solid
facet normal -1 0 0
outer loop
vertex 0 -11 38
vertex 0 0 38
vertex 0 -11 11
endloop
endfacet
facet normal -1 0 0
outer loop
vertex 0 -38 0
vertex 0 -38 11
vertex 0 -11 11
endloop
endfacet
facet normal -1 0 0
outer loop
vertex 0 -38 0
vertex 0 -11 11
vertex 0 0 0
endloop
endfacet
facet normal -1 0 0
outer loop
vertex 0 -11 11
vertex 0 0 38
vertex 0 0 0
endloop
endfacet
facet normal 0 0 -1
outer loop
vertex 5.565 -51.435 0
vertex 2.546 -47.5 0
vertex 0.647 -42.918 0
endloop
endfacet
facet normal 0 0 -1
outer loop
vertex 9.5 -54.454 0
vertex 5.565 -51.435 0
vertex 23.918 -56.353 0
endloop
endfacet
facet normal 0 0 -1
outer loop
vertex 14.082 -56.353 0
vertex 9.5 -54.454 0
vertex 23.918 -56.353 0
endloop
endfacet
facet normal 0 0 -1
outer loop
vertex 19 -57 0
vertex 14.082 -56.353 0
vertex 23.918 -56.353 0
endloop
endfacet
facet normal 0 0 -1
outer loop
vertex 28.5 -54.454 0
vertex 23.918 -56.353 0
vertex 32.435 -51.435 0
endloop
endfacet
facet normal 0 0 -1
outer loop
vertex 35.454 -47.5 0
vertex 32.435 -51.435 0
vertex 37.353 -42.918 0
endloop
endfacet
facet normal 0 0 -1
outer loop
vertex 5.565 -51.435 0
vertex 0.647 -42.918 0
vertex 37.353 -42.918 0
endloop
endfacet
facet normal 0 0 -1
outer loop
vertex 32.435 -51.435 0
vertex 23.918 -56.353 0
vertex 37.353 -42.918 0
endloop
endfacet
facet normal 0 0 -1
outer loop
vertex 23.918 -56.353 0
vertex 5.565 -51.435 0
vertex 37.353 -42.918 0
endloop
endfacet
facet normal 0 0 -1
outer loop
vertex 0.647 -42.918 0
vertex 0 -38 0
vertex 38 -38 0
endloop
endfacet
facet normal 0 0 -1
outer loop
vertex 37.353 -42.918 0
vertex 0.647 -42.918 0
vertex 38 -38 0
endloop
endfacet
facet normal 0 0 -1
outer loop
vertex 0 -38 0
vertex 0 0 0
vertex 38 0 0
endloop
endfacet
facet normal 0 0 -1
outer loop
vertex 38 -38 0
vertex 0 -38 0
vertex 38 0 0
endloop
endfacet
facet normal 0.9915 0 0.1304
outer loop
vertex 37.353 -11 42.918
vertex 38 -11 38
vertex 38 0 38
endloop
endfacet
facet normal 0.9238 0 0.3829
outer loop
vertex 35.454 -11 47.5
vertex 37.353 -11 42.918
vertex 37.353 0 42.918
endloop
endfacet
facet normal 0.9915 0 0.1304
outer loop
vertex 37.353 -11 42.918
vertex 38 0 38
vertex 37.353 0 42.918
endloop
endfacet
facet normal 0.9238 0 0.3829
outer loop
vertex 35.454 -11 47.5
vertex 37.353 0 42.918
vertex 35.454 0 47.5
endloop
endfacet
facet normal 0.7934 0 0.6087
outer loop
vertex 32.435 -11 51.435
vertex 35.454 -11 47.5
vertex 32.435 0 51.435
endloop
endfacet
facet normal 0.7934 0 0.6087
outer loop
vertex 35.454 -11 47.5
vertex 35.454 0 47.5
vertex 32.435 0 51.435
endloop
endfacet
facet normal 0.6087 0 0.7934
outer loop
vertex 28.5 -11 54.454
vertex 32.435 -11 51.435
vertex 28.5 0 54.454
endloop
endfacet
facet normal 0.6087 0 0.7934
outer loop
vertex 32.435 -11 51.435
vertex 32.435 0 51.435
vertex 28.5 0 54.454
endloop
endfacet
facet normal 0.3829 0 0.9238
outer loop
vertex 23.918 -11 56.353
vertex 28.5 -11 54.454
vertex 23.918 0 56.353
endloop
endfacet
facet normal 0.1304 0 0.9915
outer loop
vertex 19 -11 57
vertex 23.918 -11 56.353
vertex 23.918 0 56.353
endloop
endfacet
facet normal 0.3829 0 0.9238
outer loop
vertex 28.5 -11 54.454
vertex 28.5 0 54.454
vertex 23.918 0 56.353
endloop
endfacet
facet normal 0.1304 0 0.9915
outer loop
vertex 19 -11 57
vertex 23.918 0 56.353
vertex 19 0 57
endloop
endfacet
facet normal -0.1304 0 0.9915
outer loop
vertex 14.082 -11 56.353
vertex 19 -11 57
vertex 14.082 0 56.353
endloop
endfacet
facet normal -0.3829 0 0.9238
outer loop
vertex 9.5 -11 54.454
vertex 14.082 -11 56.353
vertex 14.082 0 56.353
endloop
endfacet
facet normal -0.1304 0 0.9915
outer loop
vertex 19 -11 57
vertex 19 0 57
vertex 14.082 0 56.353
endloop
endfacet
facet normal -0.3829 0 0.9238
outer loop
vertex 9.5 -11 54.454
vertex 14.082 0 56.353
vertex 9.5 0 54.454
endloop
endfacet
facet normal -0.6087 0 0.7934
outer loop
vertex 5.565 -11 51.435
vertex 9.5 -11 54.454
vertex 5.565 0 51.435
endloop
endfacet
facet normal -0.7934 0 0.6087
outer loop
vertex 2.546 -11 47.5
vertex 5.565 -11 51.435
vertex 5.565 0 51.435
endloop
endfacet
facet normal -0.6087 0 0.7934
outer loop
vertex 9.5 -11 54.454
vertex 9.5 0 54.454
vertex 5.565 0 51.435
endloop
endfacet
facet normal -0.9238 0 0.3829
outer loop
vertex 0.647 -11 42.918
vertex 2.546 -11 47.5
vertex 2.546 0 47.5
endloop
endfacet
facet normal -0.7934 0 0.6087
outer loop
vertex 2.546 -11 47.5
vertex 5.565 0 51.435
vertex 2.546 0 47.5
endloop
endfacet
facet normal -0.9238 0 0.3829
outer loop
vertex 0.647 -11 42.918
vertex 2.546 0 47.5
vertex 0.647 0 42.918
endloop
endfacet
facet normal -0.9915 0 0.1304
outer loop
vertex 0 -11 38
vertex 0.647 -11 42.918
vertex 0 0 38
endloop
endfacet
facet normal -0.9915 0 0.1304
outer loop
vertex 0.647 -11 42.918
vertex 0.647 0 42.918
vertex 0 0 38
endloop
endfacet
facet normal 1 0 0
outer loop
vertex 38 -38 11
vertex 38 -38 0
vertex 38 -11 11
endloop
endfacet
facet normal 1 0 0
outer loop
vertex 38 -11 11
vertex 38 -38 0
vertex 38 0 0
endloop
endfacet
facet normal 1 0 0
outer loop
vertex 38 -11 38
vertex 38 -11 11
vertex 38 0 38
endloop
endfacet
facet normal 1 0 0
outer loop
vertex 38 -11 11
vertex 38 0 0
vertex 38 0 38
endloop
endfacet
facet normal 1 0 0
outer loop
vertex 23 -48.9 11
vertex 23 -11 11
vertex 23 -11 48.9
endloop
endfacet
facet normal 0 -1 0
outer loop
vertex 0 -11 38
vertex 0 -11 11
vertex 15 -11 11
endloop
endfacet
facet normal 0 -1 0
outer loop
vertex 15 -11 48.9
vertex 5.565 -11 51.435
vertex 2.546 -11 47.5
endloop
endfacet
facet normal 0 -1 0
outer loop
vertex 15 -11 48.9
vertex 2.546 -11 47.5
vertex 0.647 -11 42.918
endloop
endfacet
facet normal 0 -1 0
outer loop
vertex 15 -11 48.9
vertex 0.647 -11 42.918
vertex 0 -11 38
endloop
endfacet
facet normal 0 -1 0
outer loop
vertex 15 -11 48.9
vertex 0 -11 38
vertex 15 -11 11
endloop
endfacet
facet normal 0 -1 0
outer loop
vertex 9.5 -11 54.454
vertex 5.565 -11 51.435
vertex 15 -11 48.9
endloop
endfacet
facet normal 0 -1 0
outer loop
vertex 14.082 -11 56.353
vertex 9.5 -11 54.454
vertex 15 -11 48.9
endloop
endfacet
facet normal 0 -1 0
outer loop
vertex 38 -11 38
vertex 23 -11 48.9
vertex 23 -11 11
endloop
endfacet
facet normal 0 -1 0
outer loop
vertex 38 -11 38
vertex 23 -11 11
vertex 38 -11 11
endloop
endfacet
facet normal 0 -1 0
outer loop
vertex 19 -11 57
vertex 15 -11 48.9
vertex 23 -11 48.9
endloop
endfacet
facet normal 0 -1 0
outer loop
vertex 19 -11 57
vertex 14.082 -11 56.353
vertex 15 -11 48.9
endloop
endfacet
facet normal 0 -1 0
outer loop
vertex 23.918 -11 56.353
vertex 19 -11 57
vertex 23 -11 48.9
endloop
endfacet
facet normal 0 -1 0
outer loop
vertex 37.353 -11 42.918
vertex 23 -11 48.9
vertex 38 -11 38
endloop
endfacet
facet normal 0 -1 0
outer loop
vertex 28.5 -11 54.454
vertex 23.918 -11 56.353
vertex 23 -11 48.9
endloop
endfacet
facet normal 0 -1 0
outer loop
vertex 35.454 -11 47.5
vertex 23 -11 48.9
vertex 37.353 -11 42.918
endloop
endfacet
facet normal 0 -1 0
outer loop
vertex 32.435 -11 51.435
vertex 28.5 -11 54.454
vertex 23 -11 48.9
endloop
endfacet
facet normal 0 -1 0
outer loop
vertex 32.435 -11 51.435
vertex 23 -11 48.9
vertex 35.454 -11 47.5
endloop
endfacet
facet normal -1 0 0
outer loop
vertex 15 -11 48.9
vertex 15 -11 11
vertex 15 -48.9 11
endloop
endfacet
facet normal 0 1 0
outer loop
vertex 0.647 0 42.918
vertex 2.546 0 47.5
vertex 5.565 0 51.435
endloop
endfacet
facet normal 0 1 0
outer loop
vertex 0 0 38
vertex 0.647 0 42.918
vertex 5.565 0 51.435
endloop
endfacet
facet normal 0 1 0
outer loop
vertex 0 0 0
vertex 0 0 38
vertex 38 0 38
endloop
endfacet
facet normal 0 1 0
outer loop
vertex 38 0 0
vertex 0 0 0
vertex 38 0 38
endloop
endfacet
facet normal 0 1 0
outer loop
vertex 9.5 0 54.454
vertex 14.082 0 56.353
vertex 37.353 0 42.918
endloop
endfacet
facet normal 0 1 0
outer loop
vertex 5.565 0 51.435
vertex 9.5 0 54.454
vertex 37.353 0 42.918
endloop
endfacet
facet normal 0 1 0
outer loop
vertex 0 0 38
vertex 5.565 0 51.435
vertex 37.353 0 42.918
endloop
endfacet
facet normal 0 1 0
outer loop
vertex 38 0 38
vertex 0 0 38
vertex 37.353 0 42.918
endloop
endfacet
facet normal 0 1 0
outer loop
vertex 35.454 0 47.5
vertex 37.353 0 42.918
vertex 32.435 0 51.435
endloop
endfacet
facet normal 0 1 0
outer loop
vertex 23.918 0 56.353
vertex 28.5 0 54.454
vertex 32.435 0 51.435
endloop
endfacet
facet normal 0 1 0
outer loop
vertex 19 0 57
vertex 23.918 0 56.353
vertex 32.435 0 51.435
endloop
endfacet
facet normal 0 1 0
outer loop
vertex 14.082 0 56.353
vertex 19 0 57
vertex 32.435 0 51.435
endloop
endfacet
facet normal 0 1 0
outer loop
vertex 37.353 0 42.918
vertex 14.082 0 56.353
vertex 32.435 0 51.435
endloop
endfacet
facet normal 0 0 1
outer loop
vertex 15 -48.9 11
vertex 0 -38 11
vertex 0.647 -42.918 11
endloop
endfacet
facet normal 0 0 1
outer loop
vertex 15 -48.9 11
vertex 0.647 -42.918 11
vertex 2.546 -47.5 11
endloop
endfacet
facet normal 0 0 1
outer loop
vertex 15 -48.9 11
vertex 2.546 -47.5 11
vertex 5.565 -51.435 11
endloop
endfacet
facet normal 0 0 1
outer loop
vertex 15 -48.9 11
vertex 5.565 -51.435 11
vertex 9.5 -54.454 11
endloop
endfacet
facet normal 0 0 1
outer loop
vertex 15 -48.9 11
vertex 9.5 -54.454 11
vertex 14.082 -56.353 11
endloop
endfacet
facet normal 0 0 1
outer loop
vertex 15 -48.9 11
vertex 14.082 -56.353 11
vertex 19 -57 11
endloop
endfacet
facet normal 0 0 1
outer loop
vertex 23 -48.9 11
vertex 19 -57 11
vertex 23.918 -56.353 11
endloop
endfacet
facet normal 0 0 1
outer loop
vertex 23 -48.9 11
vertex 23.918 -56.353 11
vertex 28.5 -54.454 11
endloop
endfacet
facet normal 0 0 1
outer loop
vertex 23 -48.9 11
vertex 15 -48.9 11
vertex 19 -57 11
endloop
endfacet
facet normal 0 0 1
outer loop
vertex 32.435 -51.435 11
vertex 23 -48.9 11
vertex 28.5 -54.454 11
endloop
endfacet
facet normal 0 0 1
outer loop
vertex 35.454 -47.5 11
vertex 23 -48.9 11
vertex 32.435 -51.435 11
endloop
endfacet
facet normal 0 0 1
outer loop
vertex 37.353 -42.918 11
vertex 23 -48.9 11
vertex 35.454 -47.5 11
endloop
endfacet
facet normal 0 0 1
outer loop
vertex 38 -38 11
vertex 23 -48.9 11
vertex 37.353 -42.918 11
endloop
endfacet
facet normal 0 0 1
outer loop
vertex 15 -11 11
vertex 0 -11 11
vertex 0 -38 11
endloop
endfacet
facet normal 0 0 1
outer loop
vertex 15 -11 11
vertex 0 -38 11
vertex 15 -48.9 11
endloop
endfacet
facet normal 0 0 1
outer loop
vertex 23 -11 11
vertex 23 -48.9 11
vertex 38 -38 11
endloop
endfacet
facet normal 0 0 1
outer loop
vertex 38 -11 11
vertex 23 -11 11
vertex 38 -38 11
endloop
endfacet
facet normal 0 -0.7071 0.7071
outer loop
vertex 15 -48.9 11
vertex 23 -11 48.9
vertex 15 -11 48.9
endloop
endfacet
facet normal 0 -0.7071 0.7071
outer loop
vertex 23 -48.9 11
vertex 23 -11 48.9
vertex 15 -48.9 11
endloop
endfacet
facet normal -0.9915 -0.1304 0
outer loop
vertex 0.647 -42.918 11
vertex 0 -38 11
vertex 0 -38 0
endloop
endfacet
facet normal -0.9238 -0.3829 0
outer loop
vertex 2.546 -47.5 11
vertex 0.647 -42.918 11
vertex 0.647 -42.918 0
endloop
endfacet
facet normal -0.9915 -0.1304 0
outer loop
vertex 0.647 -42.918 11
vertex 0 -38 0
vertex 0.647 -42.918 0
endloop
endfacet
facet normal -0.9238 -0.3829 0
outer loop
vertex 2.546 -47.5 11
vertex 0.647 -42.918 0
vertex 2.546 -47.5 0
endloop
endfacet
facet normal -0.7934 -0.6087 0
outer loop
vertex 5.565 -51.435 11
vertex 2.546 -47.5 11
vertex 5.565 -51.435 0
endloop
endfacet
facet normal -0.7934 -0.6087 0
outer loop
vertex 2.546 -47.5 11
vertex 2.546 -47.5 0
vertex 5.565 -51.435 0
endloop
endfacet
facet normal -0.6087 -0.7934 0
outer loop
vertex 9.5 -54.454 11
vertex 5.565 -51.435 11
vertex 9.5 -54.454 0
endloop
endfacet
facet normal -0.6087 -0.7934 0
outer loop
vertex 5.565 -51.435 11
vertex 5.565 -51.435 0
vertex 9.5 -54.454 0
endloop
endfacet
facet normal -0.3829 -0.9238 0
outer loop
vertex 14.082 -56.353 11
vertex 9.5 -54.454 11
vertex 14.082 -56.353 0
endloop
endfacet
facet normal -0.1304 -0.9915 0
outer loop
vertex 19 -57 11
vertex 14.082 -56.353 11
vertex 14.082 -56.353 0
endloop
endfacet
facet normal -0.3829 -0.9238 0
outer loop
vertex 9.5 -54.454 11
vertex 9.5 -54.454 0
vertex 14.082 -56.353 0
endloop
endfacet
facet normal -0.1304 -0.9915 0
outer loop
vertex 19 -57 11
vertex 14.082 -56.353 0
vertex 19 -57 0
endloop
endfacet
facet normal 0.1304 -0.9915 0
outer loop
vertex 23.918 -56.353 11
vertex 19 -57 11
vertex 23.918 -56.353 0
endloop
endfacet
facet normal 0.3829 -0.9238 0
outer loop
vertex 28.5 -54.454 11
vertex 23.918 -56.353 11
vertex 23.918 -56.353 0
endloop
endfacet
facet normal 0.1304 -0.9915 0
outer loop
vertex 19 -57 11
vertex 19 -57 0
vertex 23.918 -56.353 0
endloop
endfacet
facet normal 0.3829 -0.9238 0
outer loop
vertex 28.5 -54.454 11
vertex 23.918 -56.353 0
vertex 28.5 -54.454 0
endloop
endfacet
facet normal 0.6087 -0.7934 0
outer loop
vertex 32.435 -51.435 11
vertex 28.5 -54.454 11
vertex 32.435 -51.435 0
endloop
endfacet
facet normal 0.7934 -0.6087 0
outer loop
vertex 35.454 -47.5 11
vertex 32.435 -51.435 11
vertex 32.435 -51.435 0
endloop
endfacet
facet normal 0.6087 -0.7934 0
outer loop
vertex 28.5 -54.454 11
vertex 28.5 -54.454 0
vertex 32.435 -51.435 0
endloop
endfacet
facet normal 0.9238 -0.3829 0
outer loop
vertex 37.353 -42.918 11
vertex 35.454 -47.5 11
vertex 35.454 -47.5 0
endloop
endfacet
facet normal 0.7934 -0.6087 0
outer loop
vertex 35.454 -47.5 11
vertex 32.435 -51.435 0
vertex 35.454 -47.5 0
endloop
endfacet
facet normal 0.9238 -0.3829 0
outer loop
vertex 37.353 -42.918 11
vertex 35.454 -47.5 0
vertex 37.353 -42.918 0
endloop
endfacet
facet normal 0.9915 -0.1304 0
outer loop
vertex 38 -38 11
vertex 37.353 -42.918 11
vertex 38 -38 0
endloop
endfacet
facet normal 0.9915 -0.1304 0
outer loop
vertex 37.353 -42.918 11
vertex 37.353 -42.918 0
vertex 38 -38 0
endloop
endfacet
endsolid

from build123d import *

# Parameters (mm, degrees)
F1_DEPTH    = 11
F3_DEPTH    = 11
F5_W        = 8
F5_H        = 38
F6_DEPTH    = 38
F7_T4_DEPTH = 203.4479070854


# Not quite as in the source:
# - a fillet or chamfer that OpenCascade refuses, or shapes differently, is made with other operations: its cross-section is extruded or revolved along the edge and cut away or added


with BuildPart() as f1:
    # F0 (on Front) → F1 (new body)
    with BuildSketch(Plane.XZ):
        with BuildLine():
            Line((0, 38), (0, 0))
            Line((0, 0), (38, 0))
            Line((38, 0), (38, 38))
            ThreePointArc((38, 38), (19, 57), (0, 38))
        make_face()
    extrude(amount=F1_DEPTH)

    # F2 (on Top) → F3 (join)
    with BuildSketch(Plane.XY):
        with BuildLine():
            Line((38, 0), (0, 0))
            Line((0, 0), (0, -38))
            ThreePointArc((0, -38), (19, -57), (38, -38))
            Line((38, -38), (38, 0))
        make_face()
    extrude(amount=F3_DEPTH)

    # F5 (on offset) → F6 (join)
    with BuildSketch(Plane.XZ.offset(11)):
        with Locations((19, 29.9000790417)):
            Rectangle(F5_W, F5_H)
    extrude(amount=F6_DEPTH)

    # F7: chamfer of 38 on 1 edges, made by hand


with BuildPart() as f7_tool2:
    # F7_s3 → F7_t4 (new body)
    with BuildSketch(Plane.YZ.offset(120.7239535427)):
        Polygon((-11, 48.9000790417), (-49, 10.9000790417), (-49, 48.9000790417), align=None)
    extrude(amount=-F7_T4_DEPTH)

    split(bisect_by=Plane.XZ.offset(11), keep=Keep.TOP)

    split(bisect_by=Plane.XY.offset(11), keep=Keep.TOP)


with BuildPart() as f1_1:
    add(f1.part)

    # F7_t1: cut F7_tool2
    add(f7_tool2.part, mode=Mode.SUBTRACT)


solid = f1_1.part
